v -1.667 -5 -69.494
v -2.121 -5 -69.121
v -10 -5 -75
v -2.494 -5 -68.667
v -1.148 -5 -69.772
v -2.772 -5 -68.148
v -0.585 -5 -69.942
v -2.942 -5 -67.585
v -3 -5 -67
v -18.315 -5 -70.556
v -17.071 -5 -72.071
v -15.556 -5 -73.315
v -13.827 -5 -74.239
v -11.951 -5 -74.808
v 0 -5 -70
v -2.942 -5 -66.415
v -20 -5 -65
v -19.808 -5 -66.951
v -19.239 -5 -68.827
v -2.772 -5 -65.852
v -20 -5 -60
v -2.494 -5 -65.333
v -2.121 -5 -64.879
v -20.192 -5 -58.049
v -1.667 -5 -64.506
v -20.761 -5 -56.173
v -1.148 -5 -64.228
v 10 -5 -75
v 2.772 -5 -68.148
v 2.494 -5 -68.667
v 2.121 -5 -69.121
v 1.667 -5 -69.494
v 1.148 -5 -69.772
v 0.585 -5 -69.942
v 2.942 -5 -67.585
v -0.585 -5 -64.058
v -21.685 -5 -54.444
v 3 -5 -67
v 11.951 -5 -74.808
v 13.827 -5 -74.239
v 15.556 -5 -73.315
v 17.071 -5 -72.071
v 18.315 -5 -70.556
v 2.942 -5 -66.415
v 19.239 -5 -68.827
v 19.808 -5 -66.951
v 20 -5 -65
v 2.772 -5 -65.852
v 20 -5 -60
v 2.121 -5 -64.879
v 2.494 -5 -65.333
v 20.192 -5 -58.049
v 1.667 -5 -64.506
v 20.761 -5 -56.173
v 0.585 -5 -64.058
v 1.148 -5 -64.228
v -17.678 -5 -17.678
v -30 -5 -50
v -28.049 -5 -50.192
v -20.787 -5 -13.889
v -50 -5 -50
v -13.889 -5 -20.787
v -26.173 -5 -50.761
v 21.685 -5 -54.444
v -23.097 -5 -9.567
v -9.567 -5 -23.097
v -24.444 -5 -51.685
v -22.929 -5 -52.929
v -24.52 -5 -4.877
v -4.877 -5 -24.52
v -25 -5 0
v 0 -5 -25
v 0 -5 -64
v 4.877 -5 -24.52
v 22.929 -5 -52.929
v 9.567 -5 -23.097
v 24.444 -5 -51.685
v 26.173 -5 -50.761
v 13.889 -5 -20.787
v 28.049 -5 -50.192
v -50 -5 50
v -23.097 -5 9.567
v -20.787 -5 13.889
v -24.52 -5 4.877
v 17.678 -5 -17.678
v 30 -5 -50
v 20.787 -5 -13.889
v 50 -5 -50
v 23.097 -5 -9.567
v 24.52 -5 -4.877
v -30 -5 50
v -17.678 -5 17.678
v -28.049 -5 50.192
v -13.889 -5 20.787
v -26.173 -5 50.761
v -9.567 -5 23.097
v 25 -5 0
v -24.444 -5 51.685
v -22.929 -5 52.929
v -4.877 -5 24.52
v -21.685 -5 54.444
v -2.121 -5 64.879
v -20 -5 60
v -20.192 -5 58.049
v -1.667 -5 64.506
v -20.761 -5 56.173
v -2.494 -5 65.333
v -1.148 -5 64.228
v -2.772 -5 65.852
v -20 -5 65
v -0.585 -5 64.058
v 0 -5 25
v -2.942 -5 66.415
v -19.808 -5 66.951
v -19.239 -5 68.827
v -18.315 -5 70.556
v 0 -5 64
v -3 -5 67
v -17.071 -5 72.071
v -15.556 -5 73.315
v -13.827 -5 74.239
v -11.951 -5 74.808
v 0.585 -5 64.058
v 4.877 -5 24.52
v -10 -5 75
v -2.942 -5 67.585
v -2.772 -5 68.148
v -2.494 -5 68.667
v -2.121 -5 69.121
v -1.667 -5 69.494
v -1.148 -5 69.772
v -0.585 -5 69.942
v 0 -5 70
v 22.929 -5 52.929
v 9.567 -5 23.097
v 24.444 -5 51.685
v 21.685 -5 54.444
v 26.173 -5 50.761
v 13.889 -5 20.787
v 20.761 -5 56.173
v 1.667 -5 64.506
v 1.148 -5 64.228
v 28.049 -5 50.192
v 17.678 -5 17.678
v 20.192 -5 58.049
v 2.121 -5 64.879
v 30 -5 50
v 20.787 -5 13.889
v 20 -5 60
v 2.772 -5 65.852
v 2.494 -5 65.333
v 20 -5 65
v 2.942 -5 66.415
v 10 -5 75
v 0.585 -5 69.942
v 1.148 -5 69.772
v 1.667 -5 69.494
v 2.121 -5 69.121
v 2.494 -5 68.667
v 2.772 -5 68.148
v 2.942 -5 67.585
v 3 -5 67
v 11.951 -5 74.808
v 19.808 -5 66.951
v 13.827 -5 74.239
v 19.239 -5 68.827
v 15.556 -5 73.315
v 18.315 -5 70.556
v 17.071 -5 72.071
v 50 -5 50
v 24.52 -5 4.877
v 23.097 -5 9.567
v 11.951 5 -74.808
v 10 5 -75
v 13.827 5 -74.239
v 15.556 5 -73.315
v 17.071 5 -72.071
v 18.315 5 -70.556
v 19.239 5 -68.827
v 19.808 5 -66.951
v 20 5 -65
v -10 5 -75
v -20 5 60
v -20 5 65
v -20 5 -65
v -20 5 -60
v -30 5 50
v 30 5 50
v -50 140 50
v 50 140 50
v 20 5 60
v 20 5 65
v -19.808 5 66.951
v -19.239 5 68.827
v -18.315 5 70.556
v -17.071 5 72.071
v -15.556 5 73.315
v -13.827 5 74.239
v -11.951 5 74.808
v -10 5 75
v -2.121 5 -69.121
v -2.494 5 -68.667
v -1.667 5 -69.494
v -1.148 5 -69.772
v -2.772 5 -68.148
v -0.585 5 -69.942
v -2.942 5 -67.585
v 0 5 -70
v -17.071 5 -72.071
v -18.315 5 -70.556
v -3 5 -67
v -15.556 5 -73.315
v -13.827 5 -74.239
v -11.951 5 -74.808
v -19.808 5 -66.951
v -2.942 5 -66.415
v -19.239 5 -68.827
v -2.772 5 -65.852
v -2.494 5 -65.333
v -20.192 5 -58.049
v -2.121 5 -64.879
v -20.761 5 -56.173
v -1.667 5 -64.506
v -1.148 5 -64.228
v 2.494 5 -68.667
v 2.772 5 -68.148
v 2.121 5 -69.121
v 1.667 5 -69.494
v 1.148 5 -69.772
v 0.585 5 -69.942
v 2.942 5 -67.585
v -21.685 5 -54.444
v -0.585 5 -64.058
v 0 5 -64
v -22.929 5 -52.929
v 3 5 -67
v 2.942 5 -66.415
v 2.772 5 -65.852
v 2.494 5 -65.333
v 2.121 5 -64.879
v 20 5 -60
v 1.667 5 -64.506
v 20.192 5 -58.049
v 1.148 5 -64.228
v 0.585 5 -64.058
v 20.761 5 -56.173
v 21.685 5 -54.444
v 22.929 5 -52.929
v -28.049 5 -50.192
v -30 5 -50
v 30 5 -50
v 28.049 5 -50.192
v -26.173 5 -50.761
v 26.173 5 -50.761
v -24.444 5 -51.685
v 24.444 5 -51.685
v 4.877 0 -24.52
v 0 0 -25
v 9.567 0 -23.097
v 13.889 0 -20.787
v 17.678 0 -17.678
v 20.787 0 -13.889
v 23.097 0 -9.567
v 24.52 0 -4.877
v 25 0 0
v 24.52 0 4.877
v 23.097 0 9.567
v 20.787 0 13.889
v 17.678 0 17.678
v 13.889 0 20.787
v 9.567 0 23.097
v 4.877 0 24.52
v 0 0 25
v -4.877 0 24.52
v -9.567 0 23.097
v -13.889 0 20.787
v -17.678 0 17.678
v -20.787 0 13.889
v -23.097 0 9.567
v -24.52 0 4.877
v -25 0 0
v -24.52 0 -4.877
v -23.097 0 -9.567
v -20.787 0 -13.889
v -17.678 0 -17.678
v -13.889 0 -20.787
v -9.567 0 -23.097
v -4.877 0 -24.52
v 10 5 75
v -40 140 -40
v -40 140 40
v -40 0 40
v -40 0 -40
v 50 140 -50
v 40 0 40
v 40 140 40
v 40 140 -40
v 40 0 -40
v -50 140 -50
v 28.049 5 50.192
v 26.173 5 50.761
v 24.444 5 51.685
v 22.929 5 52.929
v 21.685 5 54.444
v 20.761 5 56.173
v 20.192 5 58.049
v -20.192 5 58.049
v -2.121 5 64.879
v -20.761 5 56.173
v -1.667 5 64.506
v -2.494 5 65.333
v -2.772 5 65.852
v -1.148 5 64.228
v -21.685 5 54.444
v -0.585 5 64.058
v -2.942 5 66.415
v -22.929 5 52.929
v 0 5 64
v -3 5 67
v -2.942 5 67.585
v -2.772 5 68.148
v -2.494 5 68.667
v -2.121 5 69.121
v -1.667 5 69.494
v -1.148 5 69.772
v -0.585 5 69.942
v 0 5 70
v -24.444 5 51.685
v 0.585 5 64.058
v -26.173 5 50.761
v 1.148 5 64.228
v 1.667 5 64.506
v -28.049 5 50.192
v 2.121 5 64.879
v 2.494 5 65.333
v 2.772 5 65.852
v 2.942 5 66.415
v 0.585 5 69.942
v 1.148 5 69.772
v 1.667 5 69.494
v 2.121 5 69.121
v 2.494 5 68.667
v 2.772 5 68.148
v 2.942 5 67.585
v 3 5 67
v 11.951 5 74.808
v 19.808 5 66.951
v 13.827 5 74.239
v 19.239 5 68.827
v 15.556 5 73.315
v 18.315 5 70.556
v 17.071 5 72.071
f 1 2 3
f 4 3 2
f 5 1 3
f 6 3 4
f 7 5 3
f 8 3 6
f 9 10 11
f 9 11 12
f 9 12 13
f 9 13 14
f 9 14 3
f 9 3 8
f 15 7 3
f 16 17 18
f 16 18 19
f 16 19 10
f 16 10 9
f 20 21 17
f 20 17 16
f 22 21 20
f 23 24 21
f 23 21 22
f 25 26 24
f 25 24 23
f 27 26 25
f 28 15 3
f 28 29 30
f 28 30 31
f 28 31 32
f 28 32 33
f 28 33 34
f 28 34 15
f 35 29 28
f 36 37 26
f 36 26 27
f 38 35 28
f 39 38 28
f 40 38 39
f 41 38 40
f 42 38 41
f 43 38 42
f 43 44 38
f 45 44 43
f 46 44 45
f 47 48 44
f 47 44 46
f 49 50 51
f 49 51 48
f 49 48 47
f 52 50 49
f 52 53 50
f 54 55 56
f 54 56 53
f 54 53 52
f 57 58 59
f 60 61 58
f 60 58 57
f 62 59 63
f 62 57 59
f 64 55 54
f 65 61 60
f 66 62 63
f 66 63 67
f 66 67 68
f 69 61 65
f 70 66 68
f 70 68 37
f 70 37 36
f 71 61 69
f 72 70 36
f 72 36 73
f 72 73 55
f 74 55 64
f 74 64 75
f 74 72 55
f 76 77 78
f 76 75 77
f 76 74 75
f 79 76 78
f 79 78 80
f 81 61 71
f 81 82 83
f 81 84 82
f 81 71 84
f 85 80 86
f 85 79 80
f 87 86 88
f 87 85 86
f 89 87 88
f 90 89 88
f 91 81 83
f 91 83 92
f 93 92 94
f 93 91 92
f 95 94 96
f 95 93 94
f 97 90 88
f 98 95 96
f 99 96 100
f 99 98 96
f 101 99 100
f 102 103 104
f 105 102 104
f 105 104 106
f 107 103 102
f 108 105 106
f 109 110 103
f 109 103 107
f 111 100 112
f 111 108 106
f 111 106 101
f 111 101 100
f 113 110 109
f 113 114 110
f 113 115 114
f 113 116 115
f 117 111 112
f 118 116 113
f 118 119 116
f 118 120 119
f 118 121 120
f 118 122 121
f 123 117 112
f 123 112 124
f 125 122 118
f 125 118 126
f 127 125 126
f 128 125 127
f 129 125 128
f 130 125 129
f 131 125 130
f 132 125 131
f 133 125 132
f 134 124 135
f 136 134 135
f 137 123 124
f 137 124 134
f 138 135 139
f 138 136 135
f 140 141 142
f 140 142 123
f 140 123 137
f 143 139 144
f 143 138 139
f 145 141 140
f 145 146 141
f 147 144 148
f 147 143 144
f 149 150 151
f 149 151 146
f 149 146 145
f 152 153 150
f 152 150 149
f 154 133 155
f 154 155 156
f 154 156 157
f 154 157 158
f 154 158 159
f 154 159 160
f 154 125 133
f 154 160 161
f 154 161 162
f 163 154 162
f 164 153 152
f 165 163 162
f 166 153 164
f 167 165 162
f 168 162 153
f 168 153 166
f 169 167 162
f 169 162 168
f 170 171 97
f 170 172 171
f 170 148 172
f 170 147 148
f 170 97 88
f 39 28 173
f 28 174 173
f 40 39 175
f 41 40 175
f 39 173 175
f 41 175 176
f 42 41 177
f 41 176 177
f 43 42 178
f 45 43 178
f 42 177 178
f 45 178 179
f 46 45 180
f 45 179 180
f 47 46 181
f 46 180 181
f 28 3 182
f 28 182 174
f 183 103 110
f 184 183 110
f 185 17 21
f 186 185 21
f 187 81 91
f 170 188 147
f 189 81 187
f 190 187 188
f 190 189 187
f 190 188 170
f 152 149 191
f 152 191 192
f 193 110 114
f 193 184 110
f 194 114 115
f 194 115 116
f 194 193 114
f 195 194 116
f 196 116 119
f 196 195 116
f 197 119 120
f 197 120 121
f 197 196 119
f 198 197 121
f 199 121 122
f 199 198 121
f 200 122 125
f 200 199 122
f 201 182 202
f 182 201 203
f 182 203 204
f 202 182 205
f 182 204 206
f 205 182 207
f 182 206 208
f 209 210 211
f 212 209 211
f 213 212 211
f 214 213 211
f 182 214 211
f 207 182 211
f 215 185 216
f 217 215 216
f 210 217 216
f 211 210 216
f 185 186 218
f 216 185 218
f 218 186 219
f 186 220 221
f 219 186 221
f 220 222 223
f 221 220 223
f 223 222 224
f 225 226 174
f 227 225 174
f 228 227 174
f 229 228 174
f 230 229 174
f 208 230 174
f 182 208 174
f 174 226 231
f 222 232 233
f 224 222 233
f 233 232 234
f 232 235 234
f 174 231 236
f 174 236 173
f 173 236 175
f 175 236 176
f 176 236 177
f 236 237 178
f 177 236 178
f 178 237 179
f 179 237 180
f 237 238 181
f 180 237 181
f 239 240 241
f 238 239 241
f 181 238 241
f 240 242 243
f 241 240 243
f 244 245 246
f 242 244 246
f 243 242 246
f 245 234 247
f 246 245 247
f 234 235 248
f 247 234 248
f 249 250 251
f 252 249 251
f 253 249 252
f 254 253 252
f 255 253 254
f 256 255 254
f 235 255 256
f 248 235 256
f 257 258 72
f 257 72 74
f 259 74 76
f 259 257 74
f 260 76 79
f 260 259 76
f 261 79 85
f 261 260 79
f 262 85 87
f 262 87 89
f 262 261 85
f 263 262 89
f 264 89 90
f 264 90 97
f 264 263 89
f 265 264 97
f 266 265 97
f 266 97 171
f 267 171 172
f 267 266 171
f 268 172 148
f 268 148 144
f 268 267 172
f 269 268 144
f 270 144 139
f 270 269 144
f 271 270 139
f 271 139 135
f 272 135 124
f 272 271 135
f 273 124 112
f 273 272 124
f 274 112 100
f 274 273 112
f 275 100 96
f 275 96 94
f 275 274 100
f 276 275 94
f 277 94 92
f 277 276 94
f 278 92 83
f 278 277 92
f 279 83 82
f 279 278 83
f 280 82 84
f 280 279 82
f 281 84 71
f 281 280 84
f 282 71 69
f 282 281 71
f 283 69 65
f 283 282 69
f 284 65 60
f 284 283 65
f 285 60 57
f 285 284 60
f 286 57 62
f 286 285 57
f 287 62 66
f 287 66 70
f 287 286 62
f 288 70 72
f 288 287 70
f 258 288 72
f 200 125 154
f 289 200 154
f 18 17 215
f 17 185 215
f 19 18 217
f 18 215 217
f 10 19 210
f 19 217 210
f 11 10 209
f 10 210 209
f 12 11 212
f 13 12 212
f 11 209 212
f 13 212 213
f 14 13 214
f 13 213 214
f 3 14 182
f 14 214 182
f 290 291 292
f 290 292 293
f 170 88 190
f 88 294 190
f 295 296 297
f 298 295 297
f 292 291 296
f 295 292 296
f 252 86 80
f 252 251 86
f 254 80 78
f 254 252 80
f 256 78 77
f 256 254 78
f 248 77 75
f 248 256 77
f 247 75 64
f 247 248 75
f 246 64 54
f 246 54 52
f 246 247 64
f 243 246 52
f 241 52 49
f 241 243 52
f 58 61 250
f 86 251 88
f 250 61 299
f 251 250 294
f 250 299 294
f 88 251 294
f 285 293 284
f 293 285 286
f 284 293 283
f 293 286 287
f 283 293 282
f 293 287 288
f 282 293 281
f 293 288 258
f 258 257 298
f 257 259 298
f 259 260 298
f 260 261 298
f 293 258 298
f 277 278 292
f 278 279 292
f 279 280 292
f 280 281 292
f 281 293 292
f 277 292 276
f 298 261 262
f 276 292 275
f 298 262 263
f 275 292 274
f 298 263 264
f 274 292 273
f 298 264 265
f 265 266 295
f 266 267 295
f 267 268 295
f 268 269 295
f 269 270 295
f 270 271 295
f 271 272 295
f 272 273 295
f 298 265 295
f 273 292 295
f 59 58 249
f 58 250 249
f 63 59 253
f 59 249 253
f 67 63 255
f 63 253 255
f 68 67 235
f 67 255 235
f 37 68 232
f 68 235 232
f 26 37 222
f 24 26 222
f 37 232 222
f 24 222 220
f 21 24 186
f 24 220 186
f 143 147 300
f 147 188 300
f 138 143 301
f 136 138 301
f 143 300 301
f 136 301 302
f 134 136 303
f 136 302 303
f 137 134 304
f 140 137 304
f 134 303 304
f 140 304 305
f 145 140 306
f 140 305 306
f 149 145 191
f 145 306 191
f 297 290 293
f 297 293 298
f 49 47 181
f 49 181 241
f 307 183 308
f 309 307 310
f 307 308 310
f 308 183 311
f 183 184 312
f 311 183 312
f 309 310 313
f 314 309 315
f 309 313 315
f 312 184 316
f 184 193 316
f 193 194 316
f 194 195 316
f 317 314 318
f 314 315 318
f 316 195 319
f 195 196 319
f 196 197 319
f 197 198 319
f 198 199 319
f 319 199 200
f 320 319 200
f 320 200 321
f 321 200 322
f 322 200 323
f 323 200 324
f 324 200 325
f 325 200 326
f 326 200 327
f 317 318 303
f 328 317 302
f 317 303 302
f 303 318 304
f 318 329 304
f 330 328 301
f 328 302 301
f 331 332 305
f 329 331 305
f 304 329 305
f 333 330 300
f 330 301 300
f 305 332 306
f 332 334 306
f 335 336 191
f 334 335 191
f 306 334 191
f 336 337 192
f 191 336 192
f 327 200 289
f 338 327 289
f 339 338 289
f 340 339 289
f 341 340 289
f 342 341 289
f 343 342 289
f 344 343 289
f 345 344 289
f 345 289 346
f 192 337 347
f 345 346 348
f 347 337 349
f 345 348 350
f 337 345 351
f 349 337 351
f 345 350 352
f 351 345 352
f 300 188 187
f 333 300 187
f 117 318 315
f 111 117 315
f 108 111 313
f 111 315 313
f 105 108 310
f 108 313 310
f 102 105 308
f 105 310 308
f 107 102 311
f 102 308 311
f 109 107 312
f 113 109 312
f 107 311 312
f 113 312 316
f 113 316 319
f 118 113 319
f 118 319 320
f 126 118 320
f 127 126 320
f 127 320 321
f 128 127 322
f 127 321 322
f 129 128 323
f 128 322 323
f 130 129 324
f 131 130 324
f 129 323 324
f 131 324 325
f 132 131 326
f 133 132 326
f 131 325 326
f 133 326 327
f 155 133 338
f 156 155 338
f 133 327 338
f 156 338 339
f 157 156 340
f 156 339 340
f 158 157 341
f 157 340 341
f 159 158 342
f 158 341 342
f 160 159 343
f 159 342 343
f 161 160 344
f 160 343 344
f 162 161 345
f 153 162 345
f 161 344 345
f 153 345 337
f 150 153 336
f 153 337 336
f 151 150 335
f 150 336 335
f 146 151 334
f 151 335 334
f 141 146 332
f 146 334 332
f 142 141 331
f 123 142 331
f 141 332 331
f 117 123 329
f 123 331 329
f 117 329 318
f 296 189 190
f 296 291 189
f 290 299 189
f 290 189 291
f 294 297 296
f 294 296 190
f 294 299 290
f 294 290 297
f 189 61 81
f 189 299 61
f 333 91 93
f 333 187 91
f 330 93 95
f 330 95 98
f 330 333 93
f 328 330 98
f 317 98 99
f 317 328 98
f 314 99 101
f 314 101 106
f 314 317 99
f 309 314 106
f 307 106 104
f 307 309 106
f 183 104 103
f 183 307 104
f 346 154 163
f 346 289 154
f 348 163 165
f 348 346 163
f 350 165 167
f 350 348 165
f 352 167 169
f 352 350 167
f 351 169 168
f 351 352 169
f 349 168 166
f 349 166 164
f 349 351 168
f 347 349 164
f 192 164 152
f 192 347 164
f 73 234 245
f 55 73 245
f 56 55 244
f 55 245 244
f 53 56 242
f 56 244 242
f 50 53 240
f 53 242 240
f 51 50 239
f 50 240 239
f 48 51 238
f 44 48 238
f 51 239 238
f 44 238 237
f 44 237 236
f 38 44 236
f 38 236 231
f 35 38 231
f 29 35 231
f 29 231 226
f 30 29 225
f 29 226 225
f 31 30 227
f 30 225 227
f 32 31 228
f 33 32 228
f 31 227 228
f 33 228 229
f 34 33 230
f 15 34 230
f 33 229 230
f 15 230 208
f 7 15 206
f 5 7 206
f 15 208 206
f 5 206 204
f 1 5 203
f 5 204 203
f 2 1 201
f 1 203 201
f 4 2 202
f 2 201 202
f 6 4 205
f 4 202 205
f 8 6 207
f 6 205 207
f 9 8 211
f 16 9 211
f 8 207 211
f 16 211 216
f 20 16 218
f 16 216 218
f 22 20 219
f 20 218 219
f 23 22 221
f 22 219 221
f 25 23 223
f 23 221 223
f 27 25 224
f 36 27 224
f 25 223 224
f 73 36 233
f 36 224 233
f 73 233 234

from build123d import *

# Parameters (mm, degrees)
SKETCH1_W           = 100
SKETCH1_H           = 100
SKETCH1_W_2         = 80
SKETCH1_H_2         = 80
BOSS_EXTRUDE1_DEPTH = 140
SKETCH2_W           = 100
SKETCH2_H           = 100
SKETCH2_R           = 25
BOSS_EXTRUDE2_DEPTH = 5
SKETCH3_W           = 40
SKETCH3_H           = 25
BOSS_EXTRUDE3_DEPTH = 10
SKETCH4_R           = 3
CUT_EXTRUDE1_DEPTH  = 10
FILLET1_R           = 10


with BuildPart() as part:
    # Sketch1 → Boss-Extrude1 (new body)
    with BuildSketch(Plane(origin=(0, 0, 0), x_dir=(1, 0, 0), z_dir=(0, 1, 0))):
        Rectangle(SKETCH1_W, SKETCH1_H)
        Rectangle(SKETCH1_W_2, SKETCH1_H_2, mode=Mode.SUBTRACT)
    extrude(amount=BOSS_EXTRUDE1_DEPTH)

    # Sketch2 → Boss-Extrude2 (add)
    with BuildSketch(Plane.XZ):
        Rectangle(SKETCH2_W, SKETCH2_H)
        with Locations(Location((0, 0, 0), (0, 0, 270))):
            Circle(SKETCH2_R, mode=Mode.SUBTRACT)
    extrude(amount=BOSS_EXTRUDE2_DEPTH)

    # Sketch3 → Boss-Extrude3 (add)
    with BuildSketch(Plane.XZ.offset(5)):
        with Locations((0, 62.5)):
            Rectangle(SKETCH3_W, SKETCH3_H)
        with Locations((0, -62.5)):
            Rectangle(SKETCH3_W, SKETCH3_H)
    extrude(amount=-BOSS_EXTRUDE3_DEPTH)

    # Sketch4 → Cut-Extrude1 (cut)
    with BuildSketch(Plane(origin=(0, 5, 0), x_dir=(1, 0, 0), z_dir=(0, 1, 0))):
        with Locations(Location((0, 67, 0), (0, 0, 270))):
            Circle(SKETCH4_R)
        with Locations(Location((0, -67, 0), (0, 0, 90))):
            Circle(SKETCH4_R)
    extrude(amount=-CUT_EXTRUDE1_DEPTH, mode=Mode.SUBTRACT)

    # Fillet1
    fillet1_edges = [part.edges().sort_by_distance(p)[0] for p in [
        (-20, 0, 50),
        (-20, 0, 75),
        (20, 0, 75),
        (20, 0, 50),
        (-20, 0, -50),
        (20, 0, -50),
        (20, 0, -75),
        (-20, 0, -75),
    ]]
    fillet(fillet1_edges, radius=FILLET1_R)


solid = part.part
